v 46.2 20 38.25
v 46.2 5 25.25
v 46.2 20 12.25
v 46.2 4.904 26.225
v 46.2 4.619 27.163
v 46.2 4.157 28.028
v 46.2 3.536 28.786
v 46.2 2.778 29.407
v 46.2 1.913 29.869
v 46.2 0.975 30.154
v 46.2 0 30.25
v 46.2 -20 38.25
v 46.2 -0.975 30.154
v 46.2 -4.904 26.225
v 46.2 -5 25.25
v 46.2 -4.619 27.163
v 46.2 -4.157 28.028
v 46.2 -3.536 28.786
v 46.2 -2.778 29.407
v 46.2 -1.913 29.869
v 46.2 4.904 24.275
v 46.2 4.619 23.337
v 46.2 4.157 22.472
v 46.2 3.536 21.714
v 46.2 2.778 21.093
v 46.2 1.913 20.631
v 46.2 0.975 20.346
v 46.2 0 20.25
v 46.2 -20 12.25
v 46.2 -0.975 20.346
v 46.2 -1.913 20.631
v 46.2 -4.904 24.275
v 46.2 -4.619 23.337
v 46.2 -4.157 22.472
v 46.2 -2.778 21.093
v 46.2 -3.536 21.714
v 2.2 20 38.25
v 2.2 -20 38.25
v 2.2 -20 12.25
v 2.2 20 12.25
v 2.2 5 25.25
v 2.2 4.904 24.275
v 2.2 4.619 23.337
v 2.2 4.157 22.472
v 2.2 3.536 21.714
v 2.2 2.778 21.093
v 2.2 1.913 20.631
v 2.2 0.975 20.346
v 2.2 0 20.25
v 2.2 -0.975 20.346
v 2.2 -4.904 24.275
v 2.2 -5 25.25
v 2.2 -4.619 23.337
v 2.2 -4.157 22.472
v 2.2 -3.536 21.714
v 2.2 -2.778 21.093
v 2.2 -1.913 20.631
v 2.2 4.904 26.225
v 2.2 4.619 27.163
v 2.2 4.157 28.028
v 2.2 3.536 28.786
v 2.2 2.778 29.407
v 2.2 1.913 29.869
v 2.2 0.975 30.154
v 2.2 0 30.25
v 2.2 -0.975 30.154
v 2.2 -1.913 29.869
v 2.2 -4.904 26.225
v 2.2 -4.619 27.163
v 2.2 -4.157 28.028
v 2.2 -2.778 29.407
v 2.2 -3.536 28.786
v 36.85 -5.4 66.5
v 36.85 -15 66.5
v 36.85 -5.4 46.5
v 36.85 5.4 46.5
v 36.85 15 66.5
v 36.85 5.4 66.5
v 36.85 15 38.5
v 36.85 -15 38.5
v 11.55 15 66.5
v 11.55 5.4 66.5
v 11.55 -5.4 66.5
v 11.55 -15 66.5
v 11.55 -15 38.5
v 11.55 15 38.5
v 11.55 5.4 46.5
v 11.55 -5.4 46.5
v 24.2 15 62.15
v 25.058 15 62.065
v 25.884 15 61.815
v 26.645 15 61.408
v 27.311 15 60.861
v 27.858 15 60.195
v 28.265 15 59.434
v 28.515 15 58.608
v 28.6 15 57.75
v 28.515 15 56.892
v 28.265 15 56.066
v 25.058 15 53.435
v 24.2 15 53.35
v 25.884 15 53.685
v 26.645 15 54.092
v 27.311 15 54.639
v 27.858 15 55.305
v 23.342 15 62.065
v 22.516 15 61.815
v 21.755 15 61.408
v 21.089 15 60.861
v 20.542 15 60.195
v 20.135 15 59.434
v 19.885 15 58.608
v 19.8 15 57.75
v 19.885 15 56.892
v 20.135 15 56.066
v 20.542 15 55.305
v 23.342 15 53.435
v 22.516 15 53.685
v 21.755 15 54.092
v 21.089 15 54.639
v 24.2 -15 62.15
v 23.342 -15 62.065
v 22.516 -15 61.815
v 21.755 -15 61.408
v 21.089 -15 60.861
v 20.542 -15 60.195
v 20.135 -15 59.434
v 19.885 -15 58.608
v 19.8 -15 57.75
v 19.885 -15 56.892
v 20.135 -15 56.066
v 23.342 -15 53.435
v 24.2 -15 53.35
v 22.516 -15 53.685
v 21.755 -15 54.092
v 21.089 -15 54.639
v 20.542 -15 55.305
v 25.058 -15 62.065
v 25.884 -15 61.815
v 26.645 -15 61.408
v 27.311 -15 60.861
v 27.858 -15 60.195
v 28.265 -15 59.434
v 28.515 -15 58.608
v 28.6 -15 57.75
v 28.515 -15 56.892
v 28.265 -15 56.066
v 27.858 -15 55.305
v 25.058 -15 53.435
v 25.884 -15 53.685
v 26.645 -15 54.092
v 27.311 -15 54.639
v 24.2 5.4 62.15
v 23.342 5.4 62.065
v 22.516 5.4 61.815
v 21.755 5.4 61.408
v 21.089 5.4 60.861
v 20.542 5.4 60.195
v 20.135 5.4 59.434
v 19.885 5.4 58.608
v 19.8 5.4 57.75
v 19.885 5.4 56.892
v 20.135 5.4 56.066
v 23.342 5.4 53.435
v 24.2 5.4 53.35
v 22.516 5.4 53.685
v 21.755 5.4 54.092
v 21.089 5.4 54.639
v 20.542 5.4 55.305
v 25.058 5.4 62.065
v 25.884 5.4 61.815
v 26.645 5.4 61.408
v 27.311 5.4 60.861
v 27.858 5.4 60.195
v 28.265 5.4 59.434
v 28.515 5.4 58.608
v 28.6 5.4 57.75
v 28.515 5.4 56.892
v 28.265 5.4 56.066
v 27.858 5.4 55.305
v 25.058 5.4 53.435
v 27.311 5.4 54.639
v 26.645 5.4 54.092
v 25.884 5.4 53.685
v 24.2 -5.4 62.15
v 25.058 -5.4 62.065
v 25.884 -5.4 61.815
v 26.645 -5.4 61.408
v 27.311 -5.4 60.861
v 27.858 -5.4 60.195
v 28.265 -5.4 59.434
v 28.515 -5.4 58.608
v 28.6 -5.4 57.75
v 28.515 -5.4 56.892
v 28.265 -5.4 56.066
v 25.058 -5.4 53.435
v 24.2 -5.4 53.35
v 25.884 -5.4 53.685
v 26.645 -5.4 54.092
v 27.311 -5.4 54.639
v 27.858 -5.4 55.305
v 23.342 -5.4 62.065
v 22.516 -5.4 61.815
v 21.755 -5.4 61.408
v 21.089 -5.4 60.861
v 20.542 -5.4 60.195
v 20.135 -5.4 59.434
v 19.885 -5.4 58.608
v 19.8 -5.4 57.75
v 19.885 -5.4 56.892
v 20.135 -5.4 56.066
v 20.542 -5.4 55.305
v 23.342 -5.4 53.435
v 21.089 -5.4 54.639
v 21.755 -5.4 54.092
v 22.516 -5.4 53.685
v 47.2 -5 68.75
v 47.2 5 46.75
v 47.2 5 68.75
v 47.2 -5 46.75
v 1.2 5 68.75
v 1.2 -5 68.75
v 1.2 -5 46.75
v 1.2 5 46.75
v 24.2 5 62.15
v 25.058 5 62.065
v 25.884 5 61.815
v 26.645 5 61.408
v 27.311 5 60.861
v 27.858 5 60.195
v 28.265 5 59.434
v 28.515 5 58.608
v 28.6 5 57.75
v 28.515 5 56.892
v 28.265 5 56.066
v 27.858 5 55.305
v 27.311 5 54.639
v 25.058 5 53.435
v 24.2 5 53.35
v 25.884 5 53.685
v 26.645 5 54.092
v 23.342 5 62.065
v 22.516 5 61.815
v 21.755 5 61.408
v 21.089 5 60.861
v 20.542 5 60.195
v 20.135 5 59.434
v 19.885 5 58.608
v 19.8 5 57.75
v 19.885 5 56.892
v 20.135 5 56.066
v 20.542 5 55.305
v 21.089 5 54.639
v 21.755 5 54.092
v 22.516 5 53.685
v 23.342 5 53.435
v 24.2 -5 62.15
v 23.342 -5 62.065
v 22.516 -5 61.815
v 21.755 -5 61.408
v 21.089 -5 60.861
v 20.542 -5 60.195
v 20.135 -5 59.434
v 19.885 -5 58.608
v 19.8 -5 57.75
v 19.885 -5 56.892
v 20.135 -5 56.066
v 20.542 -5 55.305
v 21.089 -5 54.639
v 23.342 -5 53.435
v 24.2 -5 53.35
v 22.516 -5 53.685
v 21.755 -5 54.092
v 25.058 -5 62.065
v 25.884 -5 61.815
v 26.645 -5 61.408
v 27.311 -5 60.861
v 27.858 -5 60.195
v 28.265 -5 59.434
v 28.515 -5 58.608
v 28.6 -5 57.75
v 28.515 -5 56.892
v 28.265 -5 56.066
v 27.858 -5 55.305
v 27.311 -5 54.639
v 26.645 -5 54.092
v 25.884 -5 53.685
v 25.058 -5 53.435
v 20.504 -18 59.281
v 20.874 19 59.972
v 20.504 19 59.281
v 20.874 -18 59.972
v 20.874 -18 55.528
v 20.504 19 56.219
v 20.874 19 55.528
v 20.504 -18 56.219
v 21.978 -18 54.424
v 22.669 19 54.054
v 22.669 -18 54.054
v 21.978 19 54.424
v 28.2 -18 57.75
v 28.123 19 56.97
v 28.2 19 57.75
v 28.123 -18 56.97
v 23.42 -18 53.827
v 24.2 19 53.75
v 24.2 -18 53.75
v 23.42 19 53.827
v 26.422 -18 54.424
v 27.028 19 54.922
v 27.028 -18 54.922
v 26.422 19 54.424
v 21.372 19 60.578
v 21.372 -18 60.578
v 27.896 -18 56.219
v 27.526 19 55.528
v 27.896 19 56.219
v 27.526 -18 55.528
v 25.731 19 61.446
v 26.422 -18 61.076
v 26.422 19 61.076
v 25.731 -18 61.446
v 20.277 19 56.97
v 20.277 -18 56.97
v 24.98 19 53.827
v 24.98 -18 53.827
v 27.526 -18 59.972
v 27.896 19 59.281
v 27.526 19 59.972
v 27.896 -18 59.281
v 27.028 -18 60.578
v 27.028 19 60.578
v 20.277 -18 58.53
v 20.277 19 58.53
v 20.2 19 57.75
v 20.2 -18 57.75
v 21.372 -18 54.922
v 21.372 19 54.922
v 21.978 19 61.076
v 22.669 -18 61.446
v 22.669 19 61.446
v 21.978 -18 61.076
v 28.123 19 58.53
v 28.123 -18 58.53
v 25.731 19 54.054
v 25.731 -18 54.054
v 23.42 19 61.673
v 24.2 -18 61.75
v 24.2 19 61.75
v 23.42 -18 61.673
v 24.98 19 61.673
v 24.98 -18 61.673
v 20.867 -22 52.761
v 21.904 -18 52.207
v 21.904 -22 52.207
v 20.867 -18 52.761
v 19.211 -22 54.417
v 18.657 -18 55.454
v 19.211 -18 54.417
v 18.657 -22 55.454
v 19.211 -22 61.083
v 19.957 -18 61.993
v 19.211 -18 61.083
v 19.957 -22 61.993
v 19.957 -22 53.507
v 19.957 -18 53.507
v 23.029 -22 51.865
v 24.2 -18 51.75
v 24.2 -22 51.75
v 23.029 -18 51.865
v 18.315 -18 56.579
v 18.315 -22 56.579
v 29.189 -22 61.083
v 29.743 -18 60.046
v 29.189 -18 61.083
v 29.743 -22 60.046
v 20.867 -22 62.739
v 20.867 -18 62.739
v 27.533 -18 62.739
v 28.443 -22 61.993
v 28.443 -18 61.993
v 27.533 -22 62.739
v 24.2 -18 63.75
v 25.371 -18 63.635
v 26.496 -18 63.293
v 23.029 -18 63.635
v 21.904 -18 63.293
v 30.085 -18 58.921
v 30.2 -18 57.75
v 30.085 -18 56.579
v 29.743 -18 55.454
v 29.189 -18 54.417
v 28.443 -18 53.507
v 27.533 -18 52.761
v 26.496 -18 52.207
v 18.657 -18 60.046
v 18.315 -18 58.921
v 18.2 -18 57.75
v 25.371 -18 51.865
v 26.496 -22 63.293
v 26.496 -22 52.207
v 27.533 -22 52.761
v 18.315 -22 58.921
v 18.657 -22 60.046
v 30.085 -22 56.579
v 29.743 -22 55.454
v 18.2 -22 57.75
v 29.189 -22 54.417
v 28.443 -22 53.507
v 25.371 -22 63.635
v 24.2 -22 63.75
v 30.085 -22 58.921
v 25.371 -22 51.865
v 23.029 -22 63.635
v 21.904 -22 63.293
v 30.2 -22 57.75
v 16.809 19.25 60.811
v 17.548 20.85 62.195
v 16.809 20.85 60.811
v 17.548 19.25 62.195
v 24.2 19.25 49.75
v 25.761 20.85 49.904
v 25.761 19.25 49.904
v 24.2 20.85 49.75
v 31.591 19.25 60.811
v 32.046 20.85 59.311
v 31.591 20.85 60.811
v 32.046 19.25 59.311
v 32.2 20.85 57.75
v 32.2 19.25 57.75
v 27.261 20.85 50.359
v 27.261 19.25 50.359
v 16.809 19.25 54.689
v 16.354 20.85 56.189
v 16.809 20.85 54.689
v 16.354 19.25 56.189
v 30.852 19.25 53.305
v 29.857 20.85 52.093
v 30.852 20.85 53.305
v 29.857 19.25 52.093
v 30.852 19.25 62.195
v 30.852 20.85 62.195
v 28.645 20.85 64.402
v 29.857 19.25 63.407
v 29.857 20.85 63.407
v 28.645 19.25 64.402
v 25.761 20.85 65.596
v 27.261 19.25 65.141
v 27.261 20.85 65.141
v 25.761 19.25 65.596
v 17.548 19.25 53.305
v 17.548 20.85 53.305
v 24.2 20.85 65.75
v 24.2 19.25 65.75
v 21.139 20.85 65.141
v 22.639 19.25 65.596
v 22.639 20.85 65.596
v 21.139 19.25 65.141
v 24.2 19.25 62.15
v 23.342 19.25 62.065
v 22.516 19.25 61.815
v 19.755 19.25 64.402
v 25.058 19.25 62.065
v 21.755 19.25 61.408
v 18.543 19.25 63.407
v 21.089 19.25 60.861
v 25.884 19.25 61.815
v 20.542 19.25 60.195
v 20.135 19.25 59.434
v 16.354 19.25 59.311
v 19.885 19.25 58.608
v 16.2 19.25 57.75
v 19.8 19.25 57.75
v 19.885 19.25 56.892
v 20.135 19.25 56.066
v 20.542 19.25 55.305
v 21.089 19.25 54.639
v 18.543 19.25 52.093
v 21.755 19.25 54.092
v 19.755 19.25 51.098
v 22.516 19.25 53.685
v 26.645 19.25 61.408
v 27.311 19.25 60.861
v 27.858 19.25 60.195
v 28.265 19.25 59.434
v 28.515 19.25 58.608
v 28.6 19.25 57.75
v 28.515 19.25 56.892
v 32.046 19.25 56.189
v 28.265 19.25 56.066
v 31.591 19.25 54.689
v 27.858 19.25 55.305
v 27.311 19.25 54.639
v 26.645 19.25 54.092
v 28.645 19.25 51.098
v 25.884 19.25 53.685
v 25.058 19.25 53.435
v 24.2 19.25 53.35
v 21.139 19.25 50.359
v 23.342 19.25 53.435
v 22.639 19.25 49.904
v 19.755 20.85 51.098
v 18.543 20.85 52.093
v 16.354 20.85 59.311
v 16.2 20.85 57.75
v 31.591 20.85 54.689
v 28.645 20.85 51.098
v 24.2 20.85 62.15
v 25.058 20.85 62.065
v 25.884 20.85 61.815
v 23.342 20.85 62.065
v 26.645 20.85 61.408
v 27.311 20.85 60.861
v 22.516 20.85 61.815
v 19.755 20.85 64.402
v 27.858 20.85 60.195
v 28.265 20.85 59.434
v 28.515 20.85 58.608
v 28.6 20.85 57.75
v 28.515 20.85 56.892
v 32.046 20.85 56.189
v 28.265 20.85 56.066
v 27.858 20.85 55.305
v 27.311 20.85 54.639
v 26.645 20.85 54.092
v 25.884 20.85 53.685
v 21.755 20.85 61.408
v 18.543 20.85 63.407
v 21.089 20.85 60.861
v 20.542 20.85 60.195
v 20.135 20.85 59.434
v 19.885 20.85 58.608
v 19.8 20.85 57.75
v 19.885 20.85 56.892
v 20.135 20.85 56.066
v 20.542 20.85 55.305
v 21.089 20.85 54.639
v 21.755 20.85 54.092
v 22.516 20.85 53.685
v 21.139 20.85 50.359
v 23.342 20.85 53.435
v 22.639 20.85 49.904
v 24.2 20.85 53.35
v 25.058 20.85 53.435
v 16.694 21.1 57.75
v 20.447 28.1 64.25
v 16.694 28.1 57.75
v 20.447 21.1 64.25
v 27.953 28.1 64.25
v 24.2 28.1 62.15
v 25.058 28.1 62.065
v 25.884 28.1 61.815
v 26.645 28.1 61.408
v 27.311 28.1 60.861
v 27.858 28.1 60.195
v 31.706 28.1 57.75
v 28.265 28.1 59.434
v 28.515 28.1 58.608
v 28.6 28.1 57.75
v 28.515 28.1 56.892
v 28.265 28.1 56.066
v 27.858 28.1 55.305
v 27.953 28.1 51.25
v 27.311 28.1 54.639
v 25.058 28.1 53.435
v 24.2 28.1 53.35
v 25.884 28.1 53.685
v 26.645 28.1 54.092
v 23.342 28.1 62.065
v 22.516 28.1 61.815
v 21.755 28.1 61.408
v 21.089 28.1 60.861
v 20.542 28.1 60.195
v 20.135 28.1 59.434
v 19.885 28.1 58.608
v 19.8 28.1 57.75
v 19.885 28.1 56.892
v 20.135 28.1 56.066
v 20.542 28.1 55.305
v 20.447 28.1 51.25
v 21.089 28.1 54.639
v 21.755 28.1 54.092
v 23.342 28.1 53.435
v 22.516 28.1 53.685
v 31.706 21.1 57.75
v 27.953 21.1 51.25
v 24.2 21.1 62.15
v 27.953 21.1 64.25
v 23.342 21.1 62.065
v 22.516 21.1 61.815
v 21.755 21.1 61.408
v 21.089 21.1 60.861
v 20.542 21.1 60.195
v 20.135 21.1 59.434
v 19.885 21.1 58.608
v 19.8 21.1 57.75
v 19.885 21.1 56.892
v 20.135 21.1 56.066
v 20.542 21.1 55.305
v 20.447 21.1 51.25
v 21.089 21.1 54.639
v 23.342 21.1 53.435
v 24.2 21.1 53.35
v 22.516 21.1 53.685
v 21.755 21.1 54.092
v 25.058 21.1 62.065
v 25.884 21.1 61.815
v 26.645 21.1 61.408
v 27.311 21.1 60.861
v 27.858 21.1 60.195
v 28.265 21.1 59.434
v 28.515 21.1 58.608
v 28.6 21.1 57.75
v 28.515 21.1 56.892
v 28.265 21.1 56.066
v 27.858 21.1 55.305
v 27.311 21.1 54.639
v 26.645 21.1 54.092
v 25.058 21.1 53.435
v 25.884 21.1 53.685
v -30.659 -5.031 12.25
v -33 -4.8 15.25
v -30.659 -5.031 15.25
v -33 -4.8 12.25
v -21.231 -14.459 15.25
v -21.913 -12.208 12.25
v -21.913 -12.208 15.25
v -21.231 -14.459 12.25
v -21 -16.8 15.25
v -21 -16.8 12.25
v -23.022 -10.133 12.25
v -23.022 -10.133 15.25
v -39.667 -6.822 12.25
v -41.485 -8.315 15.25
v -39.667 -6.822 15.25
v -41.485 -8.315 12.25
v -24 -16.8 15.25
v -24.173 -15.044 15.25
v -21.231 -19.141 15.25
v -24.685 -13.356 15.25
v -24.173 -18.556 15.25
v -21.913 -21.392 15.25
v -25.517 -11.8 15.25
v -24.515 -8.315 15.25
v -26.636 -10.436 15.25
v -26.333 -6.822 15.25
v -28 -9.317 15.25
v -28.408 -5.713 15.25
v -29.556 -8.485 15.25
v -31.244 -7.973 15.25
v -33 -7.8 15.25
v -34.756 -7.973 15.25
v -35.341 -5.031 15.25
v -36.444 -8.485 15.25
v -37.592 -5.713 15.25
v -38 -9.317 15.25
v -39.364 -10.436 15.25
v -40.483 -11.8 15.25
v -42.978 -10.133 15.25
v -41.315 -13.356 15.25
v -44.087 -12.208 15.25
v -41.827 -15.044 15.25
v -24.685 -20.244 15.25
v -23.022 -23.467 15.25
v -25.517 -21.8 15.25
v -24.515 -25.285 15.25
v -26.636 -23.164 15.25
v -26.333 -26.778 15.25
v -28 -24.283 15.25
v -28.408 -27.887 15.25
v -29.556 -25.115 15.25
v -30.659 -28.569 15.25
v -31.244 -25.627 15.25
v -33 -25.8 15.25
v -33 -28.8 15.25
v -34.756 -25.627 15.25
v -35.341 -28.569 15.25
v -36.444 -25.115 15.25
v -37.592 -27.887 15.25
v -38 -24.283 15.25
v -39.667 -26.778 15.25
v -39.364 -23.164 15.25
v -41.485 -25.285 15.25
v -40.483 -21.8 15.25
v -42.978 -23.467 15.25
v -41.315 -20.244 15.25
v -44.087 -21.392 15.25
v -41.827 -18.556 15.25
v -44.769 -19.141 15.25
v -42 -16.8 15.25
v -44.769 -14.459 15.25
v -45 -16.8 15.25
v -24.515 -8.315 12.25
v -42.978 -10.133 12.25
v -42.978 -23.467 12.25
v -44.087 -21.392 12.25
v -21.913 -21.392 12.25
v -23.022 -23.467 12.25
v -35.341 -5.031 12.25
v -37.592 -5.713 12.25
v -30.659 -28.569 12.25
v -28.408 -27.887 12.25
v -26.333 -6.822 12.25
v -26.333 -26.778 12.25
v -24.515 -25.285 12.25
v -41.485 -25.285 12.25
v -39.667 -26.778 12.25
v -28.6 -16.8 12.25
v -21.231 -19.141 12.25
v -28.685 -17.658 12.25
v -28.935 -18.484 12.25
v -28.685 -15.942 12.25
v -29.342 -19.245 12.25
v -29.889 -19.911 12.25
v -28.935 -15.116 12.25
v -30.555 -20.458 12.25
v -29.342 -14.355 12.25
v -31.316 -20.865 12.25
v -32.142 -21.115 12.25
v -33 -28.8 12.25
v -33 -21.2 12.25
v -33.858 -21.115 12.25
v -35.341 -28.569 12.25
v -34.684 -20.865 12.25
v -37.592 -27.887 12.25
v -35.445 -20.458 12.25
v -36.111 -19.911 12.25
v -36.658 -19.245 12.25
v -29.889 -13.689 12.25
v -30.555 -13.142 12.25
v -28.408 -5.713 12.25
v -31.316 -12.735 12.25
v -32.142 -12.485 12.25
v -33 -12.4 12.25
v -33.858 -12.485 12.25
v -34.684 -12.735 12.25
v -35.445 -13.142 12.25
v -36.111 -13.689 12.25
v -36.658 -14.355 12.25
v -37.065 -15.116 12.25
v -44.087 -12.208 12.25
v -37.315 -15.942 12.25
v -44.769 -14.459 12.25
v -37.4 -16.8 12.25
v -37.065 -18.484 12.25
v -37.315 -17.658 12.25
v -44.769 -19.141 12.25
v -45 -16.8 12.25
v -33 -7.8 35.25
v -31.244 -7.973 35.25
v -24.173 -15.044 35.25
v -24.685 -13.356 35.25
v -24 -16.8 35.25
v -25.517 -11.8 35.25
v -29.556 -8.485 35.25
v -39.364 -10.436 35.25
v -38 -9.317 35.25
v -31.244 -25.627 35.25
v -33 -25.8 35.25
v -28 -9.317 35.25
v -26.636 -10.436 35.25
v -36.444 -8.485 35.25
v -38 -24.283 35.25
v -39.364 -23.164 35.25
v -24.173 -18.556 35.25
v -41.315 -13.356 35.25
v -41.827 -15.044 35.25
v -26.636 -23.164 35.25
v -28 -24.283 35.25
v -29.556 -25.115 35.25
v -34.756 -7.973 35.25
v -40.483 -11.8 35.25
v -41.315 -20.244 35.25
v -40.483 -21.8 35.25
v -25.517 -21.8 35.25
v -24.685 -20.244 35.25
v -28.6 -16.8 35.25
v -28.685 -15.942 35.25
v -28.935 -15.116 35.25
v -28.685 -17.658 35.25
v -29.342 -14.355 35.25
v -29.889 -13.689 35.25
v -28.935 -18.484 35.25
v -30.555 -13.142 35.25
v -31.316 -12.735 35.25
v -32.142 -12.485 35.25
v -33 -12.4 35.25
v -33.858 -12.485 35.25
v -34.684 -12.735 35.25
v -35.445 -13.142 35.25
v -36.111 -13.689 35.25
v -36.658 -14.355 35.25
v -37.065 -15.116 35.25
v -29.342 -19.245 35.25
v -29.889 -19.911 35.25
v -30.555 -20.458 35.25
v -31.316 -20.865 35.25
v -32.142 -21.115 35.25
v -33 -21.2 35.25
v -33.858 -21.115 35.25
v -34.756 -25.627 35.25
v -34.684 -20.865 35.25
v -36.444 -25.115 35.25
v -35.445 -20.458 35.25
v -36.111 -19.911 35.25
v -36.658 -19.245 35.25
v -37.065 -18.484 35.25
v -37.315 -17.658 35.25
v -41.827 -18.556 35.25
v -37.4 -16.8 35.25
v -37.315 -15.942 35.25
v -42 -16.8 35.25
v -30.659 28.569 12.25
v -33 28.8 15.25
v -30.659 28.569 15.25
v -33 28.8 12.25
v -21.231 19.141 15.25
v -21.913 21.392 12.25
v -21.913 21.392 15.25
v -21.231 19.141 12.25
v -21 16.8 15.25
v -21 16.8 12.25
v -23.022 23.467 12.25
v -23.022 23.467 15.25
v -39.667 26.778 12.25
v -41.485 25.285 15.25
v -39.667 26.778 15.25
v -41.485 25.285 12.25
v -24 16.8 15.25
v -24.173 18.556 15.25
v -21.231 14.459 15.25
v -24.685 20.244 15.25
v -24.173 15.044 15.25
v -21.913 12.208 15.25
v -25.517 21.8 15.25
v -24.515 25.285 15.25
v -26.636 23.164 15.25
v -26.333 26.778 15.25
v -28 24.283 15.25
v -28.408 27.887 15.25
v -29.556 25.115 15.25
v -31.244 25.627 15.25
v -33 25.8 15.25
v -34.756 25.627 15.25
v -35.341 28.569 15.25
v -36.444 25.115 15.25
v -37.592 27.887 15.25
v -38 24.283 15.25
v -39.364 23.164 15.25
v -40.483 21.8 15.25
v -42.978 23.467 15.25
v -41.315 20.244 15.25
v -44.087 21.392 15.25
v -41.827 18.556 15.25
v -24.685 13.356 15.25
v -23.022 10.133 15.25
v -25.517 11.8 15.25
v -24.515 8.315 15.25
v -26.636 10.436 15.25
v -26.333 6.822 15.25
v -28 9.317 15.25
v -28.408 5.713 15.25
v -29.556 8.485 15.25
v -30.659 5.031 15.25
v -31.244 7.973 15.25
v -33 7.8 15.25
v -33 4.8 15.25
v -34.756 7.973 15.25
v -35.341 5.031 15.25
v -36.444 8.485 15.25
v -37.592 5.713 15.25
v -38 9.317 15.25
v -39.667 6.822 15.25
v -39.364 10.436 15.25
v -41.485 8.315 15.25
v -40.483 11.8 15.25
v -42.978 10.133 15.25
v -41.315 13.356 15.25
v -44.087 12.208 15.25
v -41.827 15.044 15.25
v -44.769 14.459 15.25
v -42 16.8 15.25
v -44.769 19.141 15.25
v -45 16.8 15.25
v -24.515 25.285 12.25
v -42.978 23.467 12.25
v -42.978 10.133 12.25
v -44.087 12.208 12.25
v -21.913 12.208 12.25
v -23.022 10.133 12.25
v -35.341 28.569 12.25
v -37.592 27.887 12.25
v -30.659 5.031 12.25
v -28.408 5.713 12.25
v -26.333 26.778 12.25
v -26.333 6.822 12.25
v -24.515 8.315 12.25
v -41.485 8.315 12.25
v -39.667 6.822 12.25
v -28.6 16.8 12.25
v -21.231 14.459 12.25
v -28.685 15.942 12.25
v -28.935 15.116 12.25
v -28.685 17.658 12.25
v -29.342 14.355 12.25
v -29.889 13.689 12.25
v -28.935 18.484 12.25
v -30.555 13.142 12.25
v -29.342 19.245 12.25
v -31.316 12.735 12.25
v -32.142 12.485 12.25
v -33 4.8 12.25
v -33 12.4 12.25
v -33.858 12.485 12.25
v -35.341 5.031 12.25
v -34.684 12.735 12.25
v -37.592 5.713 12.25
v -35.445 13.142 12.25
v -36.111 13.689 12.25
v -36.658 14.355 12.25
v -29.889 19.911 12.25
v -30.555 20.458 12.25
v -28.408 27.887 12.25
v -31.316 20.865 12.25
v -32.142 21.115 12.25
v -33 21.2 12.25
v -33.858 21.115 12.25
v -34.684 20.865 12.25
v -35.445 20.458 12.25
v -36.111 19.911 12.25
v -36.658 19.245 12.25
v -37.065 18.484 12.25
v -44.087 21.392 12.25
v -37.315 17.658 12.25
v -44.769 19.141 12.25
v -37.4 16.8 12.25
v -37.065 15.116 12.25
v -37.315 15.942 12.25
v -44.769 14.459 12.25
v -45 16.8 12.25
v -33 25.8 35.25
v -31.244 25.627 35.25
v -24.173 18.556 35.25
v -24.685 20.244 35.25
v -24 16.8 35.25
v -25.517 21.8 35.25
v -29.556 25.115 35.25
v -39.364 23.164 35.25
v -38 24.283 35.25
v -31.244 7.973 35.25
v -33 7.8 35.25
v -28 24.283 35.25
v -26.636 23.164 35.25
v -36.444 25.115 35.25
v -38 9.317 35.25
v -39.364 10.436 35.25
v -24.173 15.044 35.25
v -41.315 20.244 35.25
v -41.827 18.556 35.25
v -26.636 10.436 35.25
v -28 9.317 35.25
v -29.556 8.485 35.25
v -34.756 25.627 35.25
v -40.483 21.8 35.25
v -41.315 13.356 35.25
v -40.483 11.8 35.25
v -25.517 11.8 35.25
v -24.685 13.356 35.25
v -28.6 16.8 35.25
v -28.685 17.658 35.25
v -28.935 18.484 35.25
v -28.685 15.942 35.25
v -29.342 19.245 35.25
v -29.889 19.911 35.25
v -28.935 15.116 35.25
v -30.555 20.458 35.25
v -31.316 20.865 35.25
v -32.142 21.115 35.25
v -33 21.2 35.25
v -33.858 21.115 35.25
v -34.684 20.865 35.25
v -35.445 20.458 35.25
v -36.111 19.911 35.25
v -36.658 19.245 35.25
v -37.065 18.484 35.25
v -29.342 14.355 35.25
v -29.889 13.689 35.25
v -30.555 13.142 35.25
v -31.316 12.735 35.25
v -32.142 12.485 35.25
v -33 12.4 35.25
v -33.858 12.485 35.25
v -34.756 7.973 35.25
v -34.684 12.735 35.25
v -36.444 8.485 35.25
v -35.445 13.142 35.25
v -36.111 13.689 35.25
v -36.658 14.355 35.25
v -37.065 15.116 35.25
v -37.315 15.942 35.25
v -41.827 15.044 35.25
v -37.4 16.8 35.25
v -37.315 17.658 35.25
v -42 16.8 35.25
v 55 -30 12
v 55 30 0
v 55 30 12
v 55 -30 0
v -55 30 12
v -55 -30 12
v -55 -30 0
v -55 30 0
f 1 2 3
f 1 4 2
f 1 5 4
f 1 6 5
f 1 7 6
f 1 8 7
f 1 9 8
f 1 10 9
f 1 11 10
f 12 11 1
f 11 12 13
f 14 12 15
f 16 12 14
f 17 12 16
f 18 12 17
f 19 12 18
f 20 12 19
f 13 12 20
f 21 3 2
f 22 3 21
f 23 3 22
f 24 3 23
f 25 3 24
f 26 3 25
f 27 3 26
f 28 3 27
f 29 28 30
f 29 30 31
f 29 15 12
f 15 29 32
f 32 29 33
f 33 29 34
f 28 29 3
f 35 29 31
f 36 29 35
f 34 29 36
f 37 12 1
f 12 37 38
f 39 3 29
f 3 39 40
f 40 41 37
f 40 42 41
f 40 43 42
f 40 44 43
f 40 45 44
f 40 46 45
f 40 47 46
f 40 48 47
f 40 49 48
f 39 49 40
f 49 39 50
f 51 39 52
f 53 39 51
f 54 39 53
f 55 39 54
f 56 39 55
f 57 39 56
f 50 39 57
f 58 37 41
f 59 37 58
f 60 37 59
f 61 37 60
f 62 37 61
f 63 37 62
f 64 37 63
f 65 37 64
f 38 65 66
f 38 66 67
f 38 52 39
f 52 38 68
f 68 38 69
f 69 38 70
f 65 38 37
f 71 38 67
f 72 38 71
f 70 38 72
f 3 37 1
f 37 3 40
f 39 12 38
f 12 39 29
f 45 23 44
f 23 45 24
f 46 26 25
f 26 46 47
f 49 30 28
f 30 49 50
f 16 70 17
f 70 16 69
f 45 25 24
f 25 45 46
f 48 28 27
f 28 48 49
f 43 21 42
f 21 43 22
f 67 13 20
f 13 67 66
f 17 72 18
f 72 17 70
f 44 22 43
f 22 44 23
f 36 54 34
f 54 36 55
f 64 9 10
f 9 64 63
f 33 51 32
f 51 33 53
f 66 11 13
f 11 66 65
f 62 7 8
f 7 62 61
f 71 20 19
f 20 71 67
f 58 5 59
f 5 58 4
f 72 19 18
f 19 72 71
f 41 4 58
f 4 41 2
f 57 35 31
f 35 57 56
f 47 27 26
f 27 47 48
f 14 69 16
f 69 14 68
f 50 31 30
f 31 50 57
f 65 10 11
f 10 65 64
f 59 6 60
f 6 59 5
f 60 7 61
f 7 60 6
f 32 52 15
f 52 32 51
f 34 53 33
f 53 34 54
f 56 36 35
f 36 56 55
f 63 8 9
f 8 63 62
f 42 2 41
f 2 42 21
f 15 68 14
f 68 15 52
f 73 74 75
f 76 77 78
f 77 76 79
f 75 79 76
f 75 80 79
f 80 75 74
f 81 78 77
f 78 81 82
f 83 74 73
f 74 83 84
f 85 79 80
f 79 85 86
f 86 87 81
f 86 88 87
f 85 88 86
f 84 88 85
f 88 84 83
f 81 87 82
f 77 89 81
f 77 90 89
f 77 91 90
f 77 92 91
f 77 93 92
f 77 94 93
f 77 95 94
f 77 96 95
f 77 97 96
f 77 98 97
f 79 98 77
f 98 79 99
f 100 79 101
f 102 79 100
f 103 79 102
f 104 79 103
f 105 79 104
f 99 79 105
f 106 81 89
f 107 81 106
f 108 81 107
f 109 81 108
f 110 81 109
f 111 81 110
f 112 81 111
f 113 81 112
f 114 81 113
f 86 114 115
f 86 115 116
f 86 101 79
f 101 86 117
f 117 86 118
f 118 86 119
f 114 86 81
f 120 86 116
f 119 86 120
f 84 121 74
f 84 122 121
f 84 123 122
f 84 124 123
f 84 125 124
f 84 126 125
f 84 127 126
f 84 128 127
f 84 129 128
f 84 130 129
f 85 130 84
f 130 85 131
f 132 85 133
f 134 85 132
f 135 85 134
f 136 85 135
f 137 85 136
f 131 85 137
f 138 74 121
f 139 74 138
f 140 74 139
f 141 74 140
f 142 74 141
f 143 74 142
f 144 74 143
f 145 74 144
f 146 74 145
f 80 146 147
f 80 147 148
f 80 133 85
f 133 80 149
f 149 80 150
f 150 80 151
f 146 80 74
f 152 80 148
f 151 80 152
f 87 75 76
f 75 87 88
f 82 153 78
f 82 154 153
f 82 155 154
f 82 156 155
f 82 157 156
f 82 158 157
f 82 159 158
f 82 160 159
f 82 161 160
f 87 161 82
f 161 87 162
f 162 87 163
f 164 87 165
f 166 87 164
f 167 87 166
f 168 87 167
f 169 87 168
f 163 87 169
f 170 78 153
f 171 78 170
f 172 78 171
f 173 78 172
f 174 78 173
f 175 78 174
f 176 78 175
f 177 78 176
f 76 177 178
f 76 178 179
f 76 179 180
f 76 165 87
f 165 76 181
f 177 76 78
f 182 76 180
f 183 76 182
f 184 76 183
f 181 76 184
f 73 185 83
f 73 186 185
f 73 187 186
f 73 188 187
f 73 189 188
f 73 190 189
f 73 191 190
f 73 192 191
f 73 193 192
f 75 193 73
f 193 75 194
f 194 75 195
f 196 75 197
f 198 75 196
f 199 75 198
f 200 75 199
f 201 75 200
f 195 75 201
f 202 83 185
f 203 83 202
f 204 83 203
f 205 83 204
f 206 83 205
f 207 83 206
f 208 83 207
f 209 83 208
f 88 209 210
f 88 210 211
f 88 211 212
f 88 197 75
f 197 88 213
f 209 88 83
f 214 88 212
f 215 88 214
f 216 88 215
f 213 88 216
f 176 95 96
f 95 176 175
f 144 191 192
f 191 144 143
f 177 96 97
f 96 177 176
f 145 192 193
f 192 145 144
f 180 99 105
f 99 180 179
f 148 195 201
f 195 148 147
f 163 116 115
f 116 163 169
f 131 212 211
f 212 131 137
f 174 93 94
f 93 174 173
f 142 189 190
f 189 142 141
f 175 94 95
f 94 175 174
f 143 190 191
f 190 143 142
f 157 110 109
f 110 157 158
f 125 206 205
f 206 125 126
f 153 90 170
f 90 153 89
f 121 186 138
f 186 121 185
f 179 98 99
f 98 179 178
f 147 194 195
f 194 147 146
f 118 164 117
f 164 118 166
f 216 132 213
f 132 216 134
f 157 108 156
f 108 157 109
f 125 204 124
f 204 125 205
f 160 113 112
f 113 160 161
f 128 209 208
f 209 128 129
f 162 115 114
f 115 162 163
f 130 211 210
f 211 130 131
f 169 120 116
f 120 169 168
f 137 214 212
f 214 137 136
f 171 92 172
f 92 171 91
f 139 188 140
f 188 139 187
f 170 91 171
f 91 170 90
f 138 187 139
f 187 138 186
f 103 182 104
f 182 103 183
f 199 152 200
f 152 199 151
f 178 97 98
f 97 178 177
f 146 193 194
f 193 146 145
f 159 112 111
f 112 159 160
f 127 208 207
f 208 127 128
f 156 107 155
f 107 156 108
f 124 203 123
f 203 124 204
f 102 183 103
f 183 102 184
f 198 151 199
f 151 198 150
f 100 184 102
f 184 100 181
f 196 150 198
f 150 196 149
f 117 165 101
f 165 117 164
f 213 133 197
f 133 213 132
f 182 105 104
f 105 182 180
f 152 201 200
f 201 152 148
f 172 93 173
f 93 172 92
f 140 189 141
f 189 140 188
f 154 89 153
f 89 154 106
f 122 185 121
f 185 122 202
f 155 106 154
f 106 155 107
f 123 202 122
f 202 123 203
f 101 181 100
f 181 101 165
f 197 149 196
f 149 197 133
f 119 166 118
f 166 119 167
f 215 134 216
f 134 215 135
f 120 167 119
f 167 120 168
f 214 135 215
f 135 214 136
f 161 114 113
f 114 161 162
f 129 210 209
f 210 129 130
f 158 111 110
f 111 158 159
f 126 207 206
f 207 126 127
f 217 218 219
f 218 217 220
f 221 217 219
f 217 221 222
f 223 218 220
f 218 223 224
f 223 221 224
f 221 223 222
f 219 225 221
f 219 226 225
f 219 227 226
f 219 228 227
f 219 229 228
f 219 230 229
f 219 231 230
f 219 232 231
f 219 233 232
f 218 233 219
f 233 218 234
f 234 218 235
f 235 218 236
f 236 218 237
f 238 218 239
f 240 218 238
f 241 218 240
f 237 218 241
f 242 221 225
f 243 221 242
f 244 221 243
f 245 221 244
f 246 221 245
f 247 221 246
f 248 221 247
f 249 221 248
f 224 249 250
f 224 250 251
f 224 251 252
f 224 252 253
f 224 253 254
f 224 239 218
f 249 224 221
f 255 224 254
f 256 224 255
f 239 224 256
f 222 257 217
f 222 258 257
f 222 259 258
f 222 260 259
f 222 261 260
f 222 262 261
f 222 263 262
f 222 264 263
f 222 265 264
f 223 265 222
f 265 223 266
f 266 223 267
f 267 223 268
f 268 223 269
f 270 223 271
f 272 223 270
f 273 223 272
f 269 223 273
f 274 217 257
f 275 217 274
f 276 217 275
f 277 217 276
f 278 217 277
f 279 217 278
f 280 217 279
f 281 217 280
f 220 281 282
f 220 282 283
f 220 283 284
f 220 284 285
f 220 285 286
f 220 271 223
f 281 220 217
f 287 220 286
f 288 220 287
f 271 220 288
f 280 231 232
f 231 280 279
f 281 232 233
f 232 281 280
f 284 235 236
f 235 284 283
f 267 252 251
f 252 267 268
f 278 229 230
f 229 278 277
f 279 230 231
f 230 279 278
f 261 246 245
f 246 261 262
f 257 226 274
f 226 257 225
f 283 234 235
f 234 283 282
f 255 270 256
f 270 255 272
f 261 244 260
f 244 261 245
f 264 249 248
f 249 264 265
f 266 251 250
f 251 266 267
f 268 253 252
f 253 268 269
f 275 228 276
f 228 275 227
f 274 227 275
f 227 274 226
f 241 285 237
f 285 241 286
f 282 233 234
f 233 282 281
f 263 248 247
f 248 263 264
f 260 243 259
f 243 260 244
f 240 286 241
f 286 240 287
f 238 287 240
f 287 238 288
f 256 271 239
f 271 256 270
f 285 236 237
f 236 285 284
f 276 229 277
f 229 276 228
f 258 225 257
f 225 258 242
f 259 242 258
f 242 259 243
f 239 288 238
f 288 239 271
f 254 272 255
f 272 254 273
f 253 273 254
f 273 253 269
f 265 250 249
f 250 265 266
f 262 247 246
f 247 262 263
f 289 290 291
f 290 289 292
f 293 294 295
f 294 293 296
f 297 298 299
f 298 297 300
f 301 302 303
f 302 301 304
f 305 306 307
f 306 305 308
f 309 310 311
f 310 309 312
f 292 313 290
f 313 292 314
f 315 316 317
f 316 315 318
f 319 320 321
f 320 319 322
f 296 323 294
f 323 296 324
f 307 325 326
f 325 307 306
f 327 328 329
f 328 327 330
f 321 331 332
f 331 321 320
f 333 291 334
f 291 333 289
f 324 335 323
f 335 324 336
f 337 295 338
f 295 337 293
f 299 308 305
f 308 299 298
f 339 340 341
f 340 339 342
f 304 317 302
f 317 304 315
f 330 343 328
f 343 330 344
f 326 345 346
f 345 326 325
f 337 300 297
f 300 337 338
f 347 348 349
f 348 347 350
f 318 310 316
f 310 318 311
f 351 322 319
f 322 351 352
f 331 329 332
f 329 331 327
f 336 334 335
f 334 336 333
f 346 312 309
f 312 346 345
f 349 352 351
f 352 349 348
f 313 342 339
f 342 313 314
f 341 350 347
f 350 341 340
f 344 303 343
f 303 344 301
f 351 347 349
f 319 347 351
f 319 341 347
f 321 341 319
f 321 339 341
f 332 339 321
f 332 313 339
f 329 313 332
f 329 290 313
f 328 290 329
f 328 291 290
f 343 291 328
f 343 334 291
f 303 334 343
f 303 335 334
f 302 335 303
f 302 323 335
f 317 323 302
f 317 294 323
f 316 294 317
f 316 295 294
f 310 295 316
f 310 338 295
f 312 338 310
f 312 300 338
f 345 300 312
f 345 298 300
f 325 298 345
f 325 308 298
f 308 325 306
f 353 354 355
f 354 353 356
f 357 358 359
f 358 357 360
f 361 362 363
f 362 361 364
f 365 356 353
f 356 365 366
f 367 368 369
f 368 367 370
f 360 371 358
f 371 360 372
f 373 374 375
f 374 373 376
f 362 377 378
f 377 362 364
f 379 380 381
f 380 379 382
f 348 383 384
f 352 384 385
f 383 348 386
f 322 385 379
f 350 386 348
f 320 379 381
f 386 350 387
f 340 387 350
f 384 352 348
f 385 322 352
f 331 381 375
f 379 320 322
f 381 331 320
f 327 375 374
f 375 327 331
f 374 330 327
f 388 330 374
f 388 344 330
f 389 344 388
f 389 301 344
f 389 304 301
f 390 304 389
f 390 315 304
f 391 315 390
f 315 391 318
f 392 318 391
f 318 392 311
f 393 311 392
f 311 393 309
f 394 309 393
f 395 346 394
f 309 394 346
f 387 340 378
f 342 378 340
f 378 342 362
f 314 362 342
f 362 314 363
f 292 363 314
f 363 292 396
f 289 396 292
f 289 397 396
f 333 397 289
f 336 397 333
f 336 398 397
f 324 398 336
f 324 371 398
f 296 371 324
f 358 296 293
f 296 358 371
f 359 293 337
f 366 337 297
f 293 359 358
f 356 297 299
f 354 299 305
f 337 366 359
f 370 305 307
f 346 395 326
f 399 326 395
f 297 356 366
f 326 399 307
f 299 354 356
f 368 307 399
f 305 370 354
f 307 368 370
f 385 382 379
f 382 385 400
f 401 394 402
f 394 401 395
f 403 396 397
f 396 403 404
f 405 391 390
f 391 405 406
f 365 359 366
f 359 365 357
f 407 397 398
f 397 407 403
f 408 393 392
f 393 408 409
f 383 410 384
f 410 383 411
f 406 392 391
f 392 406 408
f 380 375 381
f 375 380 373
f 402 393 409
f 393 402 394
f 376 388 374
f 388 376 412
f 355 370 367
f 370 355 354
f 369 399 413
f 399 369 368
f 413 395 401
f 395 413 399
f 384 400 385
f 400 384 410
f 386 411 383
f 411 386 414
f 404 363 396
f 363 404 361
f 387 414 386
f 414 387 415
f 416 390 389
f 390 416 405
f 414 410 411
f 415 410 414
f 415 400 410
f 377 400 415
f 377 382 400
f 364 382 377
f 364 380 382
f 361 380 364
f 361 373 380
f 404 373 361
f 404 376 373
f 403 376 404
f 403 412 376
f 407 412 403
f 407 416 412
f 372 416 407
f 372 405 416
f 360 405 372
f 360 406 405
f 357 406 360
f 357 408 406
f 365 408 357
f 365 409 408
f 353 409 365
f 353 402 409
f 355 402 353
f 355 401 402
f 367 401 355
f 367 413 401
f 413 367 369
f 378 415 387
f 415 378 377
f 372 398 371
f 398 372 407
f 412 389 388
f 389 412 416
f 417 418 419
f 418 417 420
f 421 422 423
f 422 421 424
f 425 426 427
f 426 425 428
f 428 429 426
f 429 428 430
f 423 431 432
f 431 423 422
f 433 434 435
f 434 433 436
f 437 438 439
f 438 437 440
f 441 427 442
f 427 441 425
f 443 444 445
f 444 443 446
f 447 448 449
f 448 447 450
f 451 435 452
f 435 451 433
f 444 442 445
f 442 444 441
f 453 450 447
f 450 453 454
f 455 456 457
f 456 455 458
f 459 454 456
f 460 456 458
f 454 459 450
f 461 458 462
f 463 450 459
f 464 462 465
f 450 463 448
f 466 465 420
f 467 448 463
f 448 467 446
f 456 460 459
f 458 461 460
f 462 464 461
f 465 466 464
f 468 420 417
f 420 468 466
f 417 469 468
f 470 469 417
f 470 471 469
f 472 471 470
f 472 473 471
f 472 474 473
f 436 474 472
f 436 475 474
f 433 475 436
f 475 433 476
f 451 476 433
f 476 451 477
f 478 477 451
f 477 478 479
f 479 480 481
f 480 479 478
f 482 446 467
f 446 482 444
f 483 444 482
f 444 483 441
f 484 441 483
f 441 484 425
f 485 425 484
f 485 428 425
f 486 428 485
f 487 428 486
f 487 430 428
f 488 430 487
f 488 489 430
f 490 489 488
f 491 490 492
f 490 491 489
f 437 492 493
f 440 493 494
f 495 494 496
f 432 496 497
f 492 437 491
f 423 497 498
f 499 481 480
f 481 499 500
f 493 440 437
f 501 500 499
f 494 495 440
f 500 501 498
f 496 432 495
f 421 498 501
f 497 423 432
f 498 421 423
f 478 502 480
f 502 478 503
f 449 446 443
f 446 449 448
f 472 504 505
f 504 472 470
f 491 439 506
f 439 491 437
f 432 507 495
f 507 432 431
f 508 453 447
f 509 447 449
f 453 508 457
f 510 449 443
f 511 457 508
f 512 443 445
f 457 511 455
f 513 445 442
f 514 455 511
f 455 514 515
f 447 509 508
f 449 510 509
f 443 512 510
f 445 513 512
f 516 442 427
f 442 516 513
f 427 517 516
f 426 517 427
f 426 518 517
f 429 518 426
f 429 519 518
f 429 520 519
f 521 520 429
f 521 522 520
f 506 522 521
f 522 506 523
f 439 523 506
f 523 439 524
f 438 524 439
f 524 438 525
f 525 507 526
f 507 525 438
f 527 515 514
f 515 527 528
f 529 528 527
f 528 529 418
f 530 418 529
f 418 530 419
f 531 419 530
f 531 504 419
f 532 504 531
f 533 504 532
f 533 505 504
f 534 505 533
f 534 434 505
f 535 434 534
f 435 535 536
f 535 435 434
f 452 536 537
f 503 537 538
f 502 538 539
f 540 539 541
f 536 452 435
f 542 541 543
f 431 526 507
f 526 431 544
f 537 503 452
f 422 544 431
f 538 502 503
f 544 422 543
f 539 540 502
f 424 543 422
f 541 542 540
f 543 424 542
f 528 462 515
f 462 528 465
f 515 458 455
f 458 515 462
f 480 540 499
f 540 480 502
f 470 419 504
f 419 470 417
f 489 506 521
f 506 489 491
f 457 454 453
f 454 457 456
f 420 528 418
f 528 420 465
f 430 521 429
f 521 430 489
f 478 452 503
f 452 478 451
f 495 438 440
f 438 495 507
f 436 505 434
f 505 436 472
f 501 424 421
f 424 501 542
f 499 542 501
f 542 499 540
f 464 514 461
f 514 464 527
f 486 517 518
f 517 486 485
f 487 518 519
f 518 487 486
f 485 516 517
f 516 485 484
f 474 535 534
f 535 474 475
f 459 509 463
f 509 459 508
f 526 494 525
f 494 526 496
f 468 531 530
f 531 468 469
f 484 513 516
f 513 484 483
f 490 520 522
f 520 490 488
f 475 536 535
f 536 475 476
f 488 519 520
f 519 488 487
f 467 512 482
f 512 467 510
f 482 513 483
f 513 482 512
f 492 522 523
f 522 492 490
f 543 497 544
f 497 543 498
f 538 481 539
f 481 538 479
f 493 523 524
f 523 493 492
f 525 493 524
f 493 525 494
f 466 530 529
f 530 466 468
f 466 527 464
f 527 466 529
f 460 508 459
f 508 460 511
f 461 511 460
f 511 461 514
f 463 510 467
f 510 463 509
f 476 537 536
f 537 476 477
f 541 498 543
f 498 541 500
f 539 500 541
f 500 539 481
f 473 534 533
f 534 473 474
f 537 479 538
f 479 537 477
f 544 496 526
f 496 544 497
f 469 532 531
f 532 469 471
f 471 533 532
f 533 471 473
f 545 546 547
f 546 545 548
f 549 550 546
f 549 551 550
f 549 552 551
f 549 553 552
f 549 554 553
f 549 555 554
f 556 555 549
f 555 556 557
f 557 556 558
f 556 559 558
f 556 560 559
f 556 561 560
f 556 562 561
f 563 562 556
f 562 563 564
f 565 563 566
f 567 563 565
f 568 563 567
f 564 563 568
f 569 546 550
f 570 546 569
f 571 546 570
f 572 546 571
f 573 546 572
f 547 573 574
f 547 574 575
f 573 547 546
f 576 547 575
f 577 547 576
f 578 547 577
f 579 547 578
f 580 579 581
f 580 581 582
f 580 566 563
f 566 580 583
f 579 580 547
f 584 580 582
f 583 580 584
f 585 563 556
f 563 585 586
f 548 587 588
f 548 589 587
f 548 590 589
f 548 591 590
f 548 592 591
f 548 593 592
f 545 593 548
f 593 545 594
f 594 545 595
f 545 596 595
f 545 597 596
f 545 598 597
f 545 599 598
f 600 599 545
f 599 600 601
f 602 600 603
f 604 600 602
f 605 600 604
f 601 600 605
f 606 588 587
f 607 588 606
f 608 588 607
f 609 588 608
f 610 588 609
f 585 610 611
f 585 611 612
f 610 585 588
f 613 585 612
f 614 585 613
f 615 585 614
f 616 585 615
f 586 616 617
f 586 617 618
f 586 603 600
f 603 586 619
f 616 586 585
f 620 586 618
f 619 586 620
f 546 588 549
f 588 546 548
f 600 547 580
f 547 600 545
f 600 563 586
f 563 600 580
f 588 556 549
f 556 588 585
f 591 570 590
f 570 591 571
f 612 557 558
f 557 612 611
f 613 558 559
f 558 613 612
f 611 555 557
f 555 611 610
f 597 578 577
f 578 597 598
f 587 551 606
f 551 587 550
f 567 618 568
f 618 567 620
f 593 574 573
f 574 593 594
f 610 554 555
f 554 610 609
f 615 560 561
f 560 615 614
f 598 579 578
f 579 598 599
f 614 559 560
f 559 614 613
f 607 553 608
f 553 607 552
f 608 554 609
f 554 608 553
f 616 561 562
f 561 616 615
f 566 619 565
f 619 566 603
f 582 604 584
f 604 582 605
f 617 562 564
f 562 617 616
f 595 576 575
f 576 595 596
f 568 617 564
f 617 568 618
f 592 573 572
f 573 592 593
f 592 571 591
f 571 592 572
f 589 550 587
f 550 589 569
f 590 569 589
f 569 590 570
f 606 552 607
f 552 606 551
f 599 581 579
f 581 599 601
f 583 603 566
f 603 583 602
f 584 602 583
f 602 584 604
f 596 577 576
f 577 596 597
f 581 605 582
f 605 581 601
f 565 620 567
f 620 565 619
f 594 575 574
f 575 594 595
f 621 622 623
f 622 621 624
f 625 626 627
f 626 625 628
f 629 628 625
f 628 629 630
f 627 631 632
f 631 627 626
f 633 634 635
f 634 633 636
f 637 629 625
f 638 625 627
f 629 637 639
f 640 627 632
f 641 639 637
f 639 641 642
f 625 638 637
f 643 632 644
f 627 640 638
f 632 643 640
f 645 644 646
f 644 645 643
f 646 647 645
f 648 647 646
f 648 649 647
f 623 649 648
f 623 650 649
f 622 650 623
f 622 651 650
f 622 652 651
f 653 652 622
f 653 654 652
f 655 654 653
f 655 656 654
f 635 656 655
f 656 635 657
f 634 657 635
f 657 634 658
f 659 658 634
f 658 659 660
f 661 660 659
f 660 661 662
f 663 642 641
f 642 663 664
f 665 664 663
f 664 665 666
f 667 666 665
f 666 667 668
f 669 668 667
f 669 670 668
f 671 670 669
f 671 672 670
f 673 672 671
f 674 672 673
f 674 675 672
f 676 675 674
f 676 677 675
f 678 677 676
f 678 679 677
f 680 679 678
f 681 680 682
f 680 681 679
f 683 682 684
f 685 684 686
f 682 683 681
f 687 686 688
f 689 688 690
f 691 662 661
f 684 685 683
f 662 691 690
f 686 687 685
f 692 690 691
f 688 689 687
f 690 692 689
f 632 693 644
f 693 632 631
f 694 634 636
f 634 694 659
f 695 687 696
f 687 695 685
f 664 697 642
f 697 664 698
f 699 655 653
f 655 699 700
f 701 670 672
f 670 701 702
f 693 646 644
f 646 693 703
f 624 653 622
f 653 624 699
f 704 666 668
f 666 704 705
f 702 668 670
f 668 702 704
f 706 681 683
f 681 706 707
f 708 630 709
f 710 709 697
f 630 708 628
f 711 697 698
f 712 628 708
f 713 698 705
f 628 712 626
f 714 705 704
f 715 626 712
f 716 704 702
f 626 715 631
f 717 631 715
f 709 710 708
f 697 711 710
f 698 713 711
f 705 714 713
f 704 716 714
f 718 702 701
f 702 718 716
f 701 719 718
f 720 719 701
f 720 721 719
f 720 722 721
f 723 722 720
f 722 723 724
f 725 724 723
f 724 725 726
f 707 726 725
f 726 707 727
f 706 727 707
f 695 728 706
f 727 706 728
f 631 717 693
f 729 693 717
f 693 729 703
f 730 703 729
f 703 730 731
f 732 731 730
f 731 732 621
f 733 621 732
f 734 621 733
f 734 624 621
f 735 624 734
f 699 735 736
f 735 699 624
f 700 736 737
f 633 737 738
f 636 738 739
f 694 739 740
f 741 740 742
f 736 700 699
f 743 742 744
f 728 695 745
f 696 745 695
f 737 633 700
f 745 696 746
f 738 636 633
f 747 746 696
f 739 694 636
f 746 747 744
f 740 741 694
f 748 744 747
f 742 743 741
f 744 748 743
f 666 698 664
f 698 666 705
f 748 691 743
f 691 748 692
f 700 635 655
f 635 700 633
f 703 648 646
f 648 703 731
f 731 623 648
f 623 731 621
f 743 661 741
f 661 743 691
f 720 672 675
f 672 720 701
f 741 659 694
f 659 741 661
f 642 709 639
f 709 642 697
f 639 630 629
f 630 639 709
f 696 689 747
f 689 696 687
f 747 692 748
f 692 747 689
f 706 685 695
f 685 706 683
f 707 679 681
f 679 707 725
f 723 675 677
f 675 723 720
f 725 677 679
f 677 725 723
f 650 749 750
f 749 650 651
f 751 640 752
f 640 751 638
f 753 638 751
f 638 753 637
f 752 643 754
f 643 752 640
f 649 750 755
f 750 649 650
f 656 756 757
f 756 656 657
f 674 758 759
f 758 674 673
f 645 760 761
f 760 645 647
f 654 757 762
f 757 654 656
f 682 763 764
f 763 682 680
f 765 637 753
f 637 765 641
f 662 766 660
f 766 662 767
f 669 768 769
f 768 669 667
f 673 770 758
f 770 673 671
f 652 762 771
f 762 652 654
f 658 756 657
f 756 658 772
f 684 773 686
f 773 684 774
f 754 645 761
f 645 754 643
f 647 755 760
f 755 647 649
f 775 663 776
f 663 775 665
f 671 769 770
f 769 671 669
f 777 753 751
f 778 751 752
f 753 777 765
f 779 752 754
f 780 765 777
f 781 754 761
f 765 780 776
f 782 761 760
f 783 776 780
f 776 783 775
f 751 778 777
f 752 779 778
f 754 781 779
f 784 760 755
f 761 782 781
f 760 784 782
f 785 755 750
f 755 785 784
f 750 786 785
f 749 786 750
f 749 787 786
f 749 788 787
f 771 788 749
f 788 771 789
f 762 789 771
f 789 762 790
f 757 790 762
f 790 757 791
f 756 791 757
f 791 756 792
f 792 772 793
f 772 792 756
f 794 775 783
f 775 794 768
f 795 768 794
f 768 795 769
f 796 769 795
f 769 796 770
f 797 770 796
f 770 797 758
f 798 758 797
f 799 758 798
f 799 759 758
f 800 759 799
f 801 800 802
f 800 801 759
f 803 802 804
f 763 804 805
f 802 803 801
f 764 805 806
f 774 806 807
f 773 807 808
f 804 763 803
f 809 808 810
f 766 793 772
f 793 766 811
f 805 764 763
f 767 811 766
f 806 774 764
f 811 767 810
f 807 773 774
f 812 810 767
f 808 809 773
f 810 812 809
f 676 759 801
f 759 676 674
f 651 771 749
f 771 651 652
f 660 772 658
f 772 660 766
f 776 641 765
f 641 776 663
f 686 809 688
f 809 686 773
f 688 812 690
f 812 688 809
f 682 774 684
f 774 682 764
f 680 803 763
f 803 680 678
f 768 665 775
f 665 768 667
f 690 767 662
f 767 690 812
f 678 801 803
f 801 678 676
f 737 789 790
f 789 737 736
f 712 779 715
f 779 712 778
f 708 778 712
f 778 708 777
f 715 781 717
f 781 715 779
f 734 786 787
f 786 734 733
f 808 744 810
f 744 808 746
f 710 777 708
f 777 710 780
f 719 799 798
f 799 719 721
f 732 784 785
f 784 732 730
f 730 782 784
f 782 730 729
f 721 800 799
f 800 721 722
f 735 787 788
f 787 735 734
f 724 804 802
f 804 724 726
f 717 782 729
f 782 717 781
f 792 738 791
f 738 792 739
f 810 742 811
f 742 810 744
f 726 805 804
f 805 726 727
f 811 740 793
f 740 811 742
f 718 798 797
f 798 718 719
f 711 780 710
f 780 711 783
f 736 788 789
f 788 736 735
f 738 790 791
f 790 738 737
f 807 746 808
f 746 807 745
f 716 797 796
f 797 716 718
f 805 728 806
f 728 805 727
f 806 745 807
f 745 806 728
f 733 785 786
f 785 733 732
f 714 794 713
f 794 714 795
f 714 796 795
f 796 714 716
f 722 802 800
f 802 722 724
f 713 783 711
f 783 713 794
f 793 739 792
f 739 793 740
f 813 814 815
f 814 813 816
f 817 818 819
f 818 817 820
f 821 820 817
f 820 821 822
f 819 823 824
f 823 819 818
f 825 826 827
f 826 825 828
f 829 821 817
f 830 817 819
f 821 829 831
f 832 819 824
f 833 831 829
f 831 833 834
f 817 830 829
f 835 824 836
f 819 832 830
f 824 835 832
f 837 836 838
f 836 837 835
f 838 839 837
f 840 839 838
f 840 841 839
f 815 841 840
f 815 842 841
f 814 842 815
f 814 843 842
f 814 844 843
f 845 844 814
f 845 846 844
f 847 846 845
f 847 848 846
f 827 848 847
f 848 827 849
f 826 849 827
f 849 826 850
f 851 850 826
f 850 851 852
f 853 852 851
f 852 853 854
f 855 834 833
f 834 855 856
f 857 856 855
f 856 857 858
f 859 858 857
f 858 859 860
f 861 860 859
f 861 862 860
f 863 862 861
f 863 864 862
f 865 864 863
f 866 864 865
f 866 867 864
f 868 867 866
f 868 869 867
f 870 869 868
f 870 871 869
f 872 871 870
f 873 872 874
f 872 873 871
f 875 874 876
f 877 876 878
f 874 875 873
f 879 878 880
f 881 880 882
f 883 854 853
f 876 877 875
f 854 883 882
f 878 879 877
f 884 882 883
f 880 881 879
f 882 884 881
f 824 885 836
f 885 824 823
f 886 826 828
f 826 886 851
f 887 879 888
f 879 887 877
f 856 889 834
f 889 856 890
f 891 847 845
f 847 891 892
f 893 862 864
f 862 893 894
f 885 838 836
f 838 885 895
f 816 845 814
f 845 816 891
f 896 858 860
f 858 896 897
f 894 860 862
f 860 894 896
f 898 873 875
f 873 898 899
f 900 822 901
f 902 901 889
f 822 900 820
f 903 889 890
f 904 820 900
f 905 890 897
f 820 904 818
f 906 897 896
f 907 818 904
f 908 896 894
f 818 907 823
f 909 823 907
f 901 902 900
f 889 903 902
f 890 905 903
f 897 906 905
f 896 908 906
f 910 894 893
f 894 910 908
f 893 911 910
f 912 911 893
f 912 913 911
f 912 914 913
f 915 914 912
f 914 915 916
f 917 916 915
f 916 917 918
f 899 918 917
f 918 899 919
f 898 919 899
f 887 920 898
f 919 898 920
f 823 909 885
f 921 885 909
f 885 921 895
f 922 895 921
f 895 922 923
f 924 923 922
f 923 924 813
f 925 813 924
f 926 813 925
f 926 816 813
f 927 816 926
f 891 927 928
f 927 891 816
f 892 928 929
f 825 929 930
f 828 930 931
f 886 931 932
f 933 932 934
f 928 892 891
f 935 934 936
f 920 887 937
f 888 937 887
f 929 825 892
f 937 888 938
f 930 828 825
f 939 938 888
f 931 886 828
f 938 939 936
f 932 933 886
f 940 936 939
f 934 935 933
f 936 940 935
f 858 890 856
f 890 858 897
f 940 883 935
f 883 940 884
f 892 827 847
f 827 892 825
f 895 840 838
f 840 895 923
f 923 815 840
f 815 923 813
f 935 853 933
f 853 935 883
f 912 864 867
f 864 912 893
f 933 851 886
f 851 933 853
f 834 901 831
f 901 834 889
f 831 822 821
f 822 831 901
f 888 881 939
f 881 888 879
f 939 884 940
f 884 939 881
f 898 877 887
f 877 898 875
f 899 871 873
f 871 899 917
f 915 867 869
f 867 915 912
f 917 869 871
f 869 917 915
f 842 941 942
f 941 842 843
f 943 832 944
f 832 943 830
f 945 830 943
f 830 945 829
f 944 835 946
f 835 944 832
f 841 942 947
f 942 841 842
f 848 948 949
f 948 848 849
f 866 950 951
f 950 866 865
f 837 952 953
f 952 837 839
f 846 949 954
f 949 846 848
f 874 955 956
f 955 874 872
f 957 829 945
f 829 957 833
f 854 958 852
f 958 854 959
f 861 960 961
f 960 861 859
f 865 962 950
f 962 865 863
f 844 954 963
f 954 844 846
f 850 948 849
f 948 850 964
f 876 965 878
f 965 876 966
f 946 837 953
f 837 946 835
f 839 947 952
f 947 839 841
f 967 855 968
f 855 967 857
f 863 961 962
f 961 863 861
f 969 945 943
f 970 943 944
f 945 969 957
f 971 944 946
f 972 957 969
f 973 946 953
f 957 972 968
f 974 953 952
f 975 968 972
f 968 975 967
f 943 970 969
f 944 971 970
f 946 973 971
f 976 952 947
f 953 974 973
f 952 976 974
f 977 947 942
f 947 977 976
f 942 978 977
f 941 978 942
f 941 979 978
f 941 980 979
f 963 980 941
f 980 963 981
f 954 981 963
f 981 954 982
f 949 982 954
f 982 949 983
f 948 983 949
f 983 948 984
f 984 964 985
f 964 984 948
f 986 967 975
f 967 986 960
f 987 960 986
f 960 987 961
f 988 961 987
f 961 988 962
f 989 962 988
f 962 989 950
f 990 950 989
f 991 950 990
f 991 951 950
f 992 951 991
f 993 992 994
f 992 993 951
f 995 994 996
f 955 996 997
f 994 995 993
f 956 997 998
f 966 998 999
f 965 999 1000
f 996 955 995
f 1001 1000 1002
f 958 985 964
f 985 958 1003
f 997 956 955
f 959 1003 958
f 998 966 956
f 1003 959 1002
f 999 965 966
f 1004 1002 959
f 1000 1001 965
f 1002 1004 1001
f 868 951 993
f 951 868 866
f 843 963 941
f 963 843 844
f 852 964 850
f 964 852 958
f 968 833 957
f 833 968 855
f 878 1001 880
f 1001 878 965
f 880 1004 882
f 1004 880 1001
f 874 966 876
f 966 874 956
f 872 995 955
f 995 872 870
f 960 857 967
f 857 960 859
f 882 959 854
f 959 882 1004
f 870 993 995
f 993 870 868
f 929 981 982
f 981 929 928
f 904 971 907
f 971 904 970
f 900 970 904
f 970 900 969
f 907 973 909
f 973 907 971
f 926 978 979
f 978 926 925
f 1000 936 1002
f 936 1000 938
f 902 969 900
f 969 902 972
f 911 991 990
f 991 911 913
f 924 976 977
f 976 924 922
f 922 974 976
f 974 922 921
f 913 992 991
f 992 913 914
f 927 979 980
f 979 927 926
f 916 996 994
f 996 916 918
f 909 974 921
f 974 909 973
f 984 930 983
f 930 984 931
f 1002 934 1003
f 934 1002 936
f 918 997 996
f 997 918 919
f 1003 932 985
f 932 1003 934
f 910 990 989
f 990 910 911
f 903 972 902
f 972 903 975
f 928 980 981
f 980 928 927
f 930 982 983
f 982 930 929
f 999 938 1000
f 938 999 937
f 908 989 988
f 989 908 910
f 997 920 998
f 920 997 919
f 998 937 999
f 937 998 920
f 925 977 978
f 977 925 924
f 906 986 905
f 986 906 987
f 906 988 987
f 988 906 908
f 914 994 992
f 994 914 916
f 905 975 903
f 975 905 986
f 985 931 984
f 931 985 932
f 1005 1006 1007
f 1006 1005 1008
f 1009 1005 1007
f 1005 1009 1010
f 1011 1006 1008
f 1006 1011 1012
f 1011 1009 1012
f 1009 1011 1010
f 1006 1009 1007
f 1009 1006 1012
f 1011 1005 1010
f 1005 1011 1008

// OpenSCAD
$fn = 32;

// ------------------------------------------------------------------------
// Indexing jig: plate 110 x 60 mm, pin d8
// Every part is its own module, assembly() places every instance.
// ------------------------------------------------------------------------

// --- part 1 ---
module jig_plate() {
  difference() {
    translate([-55, -30, 0]) cube([110, 60, 12]);
  }
}

// --- part 2 ---
module locator_block() {
  difference() {
    translate([-22, -20, 0]) cube([44, 40, 26]);
    translate([0, 0, 13]) rotate([0, 90, 0]) cylinder(h = 46, d = 10, center = true);
  }
}

// --- part 3 ---
module index_fork() {
  difference() {
    translate([-12.65, -15, 0]) cube([25.3, 30, 28]);
    translate([-13.65, -5.4, 8]) cube([27.3, 10.8, 21]);
    translate([0, 0, 19.25]) rotate([90, 0, 0]) cylinder(h = 32, d = 8.8, center = true);
  }
}

// --- part 4 ---
module index_arm() {
  difference() {
    translate([-23, -5, 0]) cube([46, 10, 22]);
    translate([0, 0, 11]) rotate([90, 0, 0]) cylinder(h = 12, d = 8.8, center = true);
  }
}

// --- part 5 ---
module index_pin() {
  rotate([0, 90, 0]) cylinder(h = 38, d = 8, center = true);
  translate([-22, 0, 0]) rotate([0, 90, 0]) cylinder(h = 4, d = 12);
}

// --- part 6 ---
module pin_washer() {
  difference() {
      translate([0, 0, 0]) cylinder(h = 1.6, d = 16);
      translate([0, 0, -1]) cylinder(h = 3.6, d = 8.8);
    }
}

// --- part 7 ---
module lock_nut() {
  difference() {
    linear_extrude(height = 7) polygon(points = [[7.506, 0], [3.753, 6.5], [-3.753, 6.5], [-7.506, 0], [-3.753, -6.5], [3.753, -6.5]]);
    translate([0, 0, -1]) cylinder(h = 9, d = 8.8);
  }
}

// --- part 8 ---
module guide_bush_a() {
  difference() {
    union() {
      cylinder(h = 3, d = 24);
      translate([0, 0, 3]) cylinder(h = 20, d = 18);
    }
    translate([0, 0, -1]) cylinder(h = 25, d = 8.8);
  }
}

// --- part 9 ---
module guide_bush_b() {
  difference() {
    union() {
      cylinder(h = 3, d = 24);
      translate([0, 0, 3]) cylinder(h = 20, d = 18);
    }
    translate([0, 0, -1]) cylinder(h = 25, d = 8.8);
  }
}

// --- assembly ---
module assembly() {
  color([0.80, 0.24, 0.20]) translate([0, 0, 0]) rotate([0, 0, 0]) jig_plate();
  color([0.20, 0.45, 0.75]) translate([24.2, 0, 12.25]) rotate([0, 0, 0]) locator_block();
  color([0.25, 0.62, 0.32]) translate([24.2, 0, 38.5]) rotate([0, 0, 0]) index_fork();
  color([0.92, 0.70, 0.18]) translate([24.2, 0, 46.75]) rotate([0, 0, 0]) index_arm();
  color([0.58, 0.35, 0.70]) translate([24.2, 0, 57.75]) rotate([0, 0, 90]) index_pin();
  color([0.16, 0.66, 0.66]) translate([24.2, 20.85, 57.75]) rotate([90, 0, 0]) pin_washer();
  color([0.85, 0.48, 0.18]) translate([24.2, 28.1, 57.75]) rotate([90, 0, 0]) lock_nut();
  color([0.55, 0.60, 0.65]) translate([-33, -16.8, 12.25]) rotate([0, 0, 0]) guide_bush_a();
  color([0.75, 0.30, 0.55]) translate([-33, 16.8, 12.25]) rotate([0, 0, 0]) guide_bush_b();
}

assembly();
